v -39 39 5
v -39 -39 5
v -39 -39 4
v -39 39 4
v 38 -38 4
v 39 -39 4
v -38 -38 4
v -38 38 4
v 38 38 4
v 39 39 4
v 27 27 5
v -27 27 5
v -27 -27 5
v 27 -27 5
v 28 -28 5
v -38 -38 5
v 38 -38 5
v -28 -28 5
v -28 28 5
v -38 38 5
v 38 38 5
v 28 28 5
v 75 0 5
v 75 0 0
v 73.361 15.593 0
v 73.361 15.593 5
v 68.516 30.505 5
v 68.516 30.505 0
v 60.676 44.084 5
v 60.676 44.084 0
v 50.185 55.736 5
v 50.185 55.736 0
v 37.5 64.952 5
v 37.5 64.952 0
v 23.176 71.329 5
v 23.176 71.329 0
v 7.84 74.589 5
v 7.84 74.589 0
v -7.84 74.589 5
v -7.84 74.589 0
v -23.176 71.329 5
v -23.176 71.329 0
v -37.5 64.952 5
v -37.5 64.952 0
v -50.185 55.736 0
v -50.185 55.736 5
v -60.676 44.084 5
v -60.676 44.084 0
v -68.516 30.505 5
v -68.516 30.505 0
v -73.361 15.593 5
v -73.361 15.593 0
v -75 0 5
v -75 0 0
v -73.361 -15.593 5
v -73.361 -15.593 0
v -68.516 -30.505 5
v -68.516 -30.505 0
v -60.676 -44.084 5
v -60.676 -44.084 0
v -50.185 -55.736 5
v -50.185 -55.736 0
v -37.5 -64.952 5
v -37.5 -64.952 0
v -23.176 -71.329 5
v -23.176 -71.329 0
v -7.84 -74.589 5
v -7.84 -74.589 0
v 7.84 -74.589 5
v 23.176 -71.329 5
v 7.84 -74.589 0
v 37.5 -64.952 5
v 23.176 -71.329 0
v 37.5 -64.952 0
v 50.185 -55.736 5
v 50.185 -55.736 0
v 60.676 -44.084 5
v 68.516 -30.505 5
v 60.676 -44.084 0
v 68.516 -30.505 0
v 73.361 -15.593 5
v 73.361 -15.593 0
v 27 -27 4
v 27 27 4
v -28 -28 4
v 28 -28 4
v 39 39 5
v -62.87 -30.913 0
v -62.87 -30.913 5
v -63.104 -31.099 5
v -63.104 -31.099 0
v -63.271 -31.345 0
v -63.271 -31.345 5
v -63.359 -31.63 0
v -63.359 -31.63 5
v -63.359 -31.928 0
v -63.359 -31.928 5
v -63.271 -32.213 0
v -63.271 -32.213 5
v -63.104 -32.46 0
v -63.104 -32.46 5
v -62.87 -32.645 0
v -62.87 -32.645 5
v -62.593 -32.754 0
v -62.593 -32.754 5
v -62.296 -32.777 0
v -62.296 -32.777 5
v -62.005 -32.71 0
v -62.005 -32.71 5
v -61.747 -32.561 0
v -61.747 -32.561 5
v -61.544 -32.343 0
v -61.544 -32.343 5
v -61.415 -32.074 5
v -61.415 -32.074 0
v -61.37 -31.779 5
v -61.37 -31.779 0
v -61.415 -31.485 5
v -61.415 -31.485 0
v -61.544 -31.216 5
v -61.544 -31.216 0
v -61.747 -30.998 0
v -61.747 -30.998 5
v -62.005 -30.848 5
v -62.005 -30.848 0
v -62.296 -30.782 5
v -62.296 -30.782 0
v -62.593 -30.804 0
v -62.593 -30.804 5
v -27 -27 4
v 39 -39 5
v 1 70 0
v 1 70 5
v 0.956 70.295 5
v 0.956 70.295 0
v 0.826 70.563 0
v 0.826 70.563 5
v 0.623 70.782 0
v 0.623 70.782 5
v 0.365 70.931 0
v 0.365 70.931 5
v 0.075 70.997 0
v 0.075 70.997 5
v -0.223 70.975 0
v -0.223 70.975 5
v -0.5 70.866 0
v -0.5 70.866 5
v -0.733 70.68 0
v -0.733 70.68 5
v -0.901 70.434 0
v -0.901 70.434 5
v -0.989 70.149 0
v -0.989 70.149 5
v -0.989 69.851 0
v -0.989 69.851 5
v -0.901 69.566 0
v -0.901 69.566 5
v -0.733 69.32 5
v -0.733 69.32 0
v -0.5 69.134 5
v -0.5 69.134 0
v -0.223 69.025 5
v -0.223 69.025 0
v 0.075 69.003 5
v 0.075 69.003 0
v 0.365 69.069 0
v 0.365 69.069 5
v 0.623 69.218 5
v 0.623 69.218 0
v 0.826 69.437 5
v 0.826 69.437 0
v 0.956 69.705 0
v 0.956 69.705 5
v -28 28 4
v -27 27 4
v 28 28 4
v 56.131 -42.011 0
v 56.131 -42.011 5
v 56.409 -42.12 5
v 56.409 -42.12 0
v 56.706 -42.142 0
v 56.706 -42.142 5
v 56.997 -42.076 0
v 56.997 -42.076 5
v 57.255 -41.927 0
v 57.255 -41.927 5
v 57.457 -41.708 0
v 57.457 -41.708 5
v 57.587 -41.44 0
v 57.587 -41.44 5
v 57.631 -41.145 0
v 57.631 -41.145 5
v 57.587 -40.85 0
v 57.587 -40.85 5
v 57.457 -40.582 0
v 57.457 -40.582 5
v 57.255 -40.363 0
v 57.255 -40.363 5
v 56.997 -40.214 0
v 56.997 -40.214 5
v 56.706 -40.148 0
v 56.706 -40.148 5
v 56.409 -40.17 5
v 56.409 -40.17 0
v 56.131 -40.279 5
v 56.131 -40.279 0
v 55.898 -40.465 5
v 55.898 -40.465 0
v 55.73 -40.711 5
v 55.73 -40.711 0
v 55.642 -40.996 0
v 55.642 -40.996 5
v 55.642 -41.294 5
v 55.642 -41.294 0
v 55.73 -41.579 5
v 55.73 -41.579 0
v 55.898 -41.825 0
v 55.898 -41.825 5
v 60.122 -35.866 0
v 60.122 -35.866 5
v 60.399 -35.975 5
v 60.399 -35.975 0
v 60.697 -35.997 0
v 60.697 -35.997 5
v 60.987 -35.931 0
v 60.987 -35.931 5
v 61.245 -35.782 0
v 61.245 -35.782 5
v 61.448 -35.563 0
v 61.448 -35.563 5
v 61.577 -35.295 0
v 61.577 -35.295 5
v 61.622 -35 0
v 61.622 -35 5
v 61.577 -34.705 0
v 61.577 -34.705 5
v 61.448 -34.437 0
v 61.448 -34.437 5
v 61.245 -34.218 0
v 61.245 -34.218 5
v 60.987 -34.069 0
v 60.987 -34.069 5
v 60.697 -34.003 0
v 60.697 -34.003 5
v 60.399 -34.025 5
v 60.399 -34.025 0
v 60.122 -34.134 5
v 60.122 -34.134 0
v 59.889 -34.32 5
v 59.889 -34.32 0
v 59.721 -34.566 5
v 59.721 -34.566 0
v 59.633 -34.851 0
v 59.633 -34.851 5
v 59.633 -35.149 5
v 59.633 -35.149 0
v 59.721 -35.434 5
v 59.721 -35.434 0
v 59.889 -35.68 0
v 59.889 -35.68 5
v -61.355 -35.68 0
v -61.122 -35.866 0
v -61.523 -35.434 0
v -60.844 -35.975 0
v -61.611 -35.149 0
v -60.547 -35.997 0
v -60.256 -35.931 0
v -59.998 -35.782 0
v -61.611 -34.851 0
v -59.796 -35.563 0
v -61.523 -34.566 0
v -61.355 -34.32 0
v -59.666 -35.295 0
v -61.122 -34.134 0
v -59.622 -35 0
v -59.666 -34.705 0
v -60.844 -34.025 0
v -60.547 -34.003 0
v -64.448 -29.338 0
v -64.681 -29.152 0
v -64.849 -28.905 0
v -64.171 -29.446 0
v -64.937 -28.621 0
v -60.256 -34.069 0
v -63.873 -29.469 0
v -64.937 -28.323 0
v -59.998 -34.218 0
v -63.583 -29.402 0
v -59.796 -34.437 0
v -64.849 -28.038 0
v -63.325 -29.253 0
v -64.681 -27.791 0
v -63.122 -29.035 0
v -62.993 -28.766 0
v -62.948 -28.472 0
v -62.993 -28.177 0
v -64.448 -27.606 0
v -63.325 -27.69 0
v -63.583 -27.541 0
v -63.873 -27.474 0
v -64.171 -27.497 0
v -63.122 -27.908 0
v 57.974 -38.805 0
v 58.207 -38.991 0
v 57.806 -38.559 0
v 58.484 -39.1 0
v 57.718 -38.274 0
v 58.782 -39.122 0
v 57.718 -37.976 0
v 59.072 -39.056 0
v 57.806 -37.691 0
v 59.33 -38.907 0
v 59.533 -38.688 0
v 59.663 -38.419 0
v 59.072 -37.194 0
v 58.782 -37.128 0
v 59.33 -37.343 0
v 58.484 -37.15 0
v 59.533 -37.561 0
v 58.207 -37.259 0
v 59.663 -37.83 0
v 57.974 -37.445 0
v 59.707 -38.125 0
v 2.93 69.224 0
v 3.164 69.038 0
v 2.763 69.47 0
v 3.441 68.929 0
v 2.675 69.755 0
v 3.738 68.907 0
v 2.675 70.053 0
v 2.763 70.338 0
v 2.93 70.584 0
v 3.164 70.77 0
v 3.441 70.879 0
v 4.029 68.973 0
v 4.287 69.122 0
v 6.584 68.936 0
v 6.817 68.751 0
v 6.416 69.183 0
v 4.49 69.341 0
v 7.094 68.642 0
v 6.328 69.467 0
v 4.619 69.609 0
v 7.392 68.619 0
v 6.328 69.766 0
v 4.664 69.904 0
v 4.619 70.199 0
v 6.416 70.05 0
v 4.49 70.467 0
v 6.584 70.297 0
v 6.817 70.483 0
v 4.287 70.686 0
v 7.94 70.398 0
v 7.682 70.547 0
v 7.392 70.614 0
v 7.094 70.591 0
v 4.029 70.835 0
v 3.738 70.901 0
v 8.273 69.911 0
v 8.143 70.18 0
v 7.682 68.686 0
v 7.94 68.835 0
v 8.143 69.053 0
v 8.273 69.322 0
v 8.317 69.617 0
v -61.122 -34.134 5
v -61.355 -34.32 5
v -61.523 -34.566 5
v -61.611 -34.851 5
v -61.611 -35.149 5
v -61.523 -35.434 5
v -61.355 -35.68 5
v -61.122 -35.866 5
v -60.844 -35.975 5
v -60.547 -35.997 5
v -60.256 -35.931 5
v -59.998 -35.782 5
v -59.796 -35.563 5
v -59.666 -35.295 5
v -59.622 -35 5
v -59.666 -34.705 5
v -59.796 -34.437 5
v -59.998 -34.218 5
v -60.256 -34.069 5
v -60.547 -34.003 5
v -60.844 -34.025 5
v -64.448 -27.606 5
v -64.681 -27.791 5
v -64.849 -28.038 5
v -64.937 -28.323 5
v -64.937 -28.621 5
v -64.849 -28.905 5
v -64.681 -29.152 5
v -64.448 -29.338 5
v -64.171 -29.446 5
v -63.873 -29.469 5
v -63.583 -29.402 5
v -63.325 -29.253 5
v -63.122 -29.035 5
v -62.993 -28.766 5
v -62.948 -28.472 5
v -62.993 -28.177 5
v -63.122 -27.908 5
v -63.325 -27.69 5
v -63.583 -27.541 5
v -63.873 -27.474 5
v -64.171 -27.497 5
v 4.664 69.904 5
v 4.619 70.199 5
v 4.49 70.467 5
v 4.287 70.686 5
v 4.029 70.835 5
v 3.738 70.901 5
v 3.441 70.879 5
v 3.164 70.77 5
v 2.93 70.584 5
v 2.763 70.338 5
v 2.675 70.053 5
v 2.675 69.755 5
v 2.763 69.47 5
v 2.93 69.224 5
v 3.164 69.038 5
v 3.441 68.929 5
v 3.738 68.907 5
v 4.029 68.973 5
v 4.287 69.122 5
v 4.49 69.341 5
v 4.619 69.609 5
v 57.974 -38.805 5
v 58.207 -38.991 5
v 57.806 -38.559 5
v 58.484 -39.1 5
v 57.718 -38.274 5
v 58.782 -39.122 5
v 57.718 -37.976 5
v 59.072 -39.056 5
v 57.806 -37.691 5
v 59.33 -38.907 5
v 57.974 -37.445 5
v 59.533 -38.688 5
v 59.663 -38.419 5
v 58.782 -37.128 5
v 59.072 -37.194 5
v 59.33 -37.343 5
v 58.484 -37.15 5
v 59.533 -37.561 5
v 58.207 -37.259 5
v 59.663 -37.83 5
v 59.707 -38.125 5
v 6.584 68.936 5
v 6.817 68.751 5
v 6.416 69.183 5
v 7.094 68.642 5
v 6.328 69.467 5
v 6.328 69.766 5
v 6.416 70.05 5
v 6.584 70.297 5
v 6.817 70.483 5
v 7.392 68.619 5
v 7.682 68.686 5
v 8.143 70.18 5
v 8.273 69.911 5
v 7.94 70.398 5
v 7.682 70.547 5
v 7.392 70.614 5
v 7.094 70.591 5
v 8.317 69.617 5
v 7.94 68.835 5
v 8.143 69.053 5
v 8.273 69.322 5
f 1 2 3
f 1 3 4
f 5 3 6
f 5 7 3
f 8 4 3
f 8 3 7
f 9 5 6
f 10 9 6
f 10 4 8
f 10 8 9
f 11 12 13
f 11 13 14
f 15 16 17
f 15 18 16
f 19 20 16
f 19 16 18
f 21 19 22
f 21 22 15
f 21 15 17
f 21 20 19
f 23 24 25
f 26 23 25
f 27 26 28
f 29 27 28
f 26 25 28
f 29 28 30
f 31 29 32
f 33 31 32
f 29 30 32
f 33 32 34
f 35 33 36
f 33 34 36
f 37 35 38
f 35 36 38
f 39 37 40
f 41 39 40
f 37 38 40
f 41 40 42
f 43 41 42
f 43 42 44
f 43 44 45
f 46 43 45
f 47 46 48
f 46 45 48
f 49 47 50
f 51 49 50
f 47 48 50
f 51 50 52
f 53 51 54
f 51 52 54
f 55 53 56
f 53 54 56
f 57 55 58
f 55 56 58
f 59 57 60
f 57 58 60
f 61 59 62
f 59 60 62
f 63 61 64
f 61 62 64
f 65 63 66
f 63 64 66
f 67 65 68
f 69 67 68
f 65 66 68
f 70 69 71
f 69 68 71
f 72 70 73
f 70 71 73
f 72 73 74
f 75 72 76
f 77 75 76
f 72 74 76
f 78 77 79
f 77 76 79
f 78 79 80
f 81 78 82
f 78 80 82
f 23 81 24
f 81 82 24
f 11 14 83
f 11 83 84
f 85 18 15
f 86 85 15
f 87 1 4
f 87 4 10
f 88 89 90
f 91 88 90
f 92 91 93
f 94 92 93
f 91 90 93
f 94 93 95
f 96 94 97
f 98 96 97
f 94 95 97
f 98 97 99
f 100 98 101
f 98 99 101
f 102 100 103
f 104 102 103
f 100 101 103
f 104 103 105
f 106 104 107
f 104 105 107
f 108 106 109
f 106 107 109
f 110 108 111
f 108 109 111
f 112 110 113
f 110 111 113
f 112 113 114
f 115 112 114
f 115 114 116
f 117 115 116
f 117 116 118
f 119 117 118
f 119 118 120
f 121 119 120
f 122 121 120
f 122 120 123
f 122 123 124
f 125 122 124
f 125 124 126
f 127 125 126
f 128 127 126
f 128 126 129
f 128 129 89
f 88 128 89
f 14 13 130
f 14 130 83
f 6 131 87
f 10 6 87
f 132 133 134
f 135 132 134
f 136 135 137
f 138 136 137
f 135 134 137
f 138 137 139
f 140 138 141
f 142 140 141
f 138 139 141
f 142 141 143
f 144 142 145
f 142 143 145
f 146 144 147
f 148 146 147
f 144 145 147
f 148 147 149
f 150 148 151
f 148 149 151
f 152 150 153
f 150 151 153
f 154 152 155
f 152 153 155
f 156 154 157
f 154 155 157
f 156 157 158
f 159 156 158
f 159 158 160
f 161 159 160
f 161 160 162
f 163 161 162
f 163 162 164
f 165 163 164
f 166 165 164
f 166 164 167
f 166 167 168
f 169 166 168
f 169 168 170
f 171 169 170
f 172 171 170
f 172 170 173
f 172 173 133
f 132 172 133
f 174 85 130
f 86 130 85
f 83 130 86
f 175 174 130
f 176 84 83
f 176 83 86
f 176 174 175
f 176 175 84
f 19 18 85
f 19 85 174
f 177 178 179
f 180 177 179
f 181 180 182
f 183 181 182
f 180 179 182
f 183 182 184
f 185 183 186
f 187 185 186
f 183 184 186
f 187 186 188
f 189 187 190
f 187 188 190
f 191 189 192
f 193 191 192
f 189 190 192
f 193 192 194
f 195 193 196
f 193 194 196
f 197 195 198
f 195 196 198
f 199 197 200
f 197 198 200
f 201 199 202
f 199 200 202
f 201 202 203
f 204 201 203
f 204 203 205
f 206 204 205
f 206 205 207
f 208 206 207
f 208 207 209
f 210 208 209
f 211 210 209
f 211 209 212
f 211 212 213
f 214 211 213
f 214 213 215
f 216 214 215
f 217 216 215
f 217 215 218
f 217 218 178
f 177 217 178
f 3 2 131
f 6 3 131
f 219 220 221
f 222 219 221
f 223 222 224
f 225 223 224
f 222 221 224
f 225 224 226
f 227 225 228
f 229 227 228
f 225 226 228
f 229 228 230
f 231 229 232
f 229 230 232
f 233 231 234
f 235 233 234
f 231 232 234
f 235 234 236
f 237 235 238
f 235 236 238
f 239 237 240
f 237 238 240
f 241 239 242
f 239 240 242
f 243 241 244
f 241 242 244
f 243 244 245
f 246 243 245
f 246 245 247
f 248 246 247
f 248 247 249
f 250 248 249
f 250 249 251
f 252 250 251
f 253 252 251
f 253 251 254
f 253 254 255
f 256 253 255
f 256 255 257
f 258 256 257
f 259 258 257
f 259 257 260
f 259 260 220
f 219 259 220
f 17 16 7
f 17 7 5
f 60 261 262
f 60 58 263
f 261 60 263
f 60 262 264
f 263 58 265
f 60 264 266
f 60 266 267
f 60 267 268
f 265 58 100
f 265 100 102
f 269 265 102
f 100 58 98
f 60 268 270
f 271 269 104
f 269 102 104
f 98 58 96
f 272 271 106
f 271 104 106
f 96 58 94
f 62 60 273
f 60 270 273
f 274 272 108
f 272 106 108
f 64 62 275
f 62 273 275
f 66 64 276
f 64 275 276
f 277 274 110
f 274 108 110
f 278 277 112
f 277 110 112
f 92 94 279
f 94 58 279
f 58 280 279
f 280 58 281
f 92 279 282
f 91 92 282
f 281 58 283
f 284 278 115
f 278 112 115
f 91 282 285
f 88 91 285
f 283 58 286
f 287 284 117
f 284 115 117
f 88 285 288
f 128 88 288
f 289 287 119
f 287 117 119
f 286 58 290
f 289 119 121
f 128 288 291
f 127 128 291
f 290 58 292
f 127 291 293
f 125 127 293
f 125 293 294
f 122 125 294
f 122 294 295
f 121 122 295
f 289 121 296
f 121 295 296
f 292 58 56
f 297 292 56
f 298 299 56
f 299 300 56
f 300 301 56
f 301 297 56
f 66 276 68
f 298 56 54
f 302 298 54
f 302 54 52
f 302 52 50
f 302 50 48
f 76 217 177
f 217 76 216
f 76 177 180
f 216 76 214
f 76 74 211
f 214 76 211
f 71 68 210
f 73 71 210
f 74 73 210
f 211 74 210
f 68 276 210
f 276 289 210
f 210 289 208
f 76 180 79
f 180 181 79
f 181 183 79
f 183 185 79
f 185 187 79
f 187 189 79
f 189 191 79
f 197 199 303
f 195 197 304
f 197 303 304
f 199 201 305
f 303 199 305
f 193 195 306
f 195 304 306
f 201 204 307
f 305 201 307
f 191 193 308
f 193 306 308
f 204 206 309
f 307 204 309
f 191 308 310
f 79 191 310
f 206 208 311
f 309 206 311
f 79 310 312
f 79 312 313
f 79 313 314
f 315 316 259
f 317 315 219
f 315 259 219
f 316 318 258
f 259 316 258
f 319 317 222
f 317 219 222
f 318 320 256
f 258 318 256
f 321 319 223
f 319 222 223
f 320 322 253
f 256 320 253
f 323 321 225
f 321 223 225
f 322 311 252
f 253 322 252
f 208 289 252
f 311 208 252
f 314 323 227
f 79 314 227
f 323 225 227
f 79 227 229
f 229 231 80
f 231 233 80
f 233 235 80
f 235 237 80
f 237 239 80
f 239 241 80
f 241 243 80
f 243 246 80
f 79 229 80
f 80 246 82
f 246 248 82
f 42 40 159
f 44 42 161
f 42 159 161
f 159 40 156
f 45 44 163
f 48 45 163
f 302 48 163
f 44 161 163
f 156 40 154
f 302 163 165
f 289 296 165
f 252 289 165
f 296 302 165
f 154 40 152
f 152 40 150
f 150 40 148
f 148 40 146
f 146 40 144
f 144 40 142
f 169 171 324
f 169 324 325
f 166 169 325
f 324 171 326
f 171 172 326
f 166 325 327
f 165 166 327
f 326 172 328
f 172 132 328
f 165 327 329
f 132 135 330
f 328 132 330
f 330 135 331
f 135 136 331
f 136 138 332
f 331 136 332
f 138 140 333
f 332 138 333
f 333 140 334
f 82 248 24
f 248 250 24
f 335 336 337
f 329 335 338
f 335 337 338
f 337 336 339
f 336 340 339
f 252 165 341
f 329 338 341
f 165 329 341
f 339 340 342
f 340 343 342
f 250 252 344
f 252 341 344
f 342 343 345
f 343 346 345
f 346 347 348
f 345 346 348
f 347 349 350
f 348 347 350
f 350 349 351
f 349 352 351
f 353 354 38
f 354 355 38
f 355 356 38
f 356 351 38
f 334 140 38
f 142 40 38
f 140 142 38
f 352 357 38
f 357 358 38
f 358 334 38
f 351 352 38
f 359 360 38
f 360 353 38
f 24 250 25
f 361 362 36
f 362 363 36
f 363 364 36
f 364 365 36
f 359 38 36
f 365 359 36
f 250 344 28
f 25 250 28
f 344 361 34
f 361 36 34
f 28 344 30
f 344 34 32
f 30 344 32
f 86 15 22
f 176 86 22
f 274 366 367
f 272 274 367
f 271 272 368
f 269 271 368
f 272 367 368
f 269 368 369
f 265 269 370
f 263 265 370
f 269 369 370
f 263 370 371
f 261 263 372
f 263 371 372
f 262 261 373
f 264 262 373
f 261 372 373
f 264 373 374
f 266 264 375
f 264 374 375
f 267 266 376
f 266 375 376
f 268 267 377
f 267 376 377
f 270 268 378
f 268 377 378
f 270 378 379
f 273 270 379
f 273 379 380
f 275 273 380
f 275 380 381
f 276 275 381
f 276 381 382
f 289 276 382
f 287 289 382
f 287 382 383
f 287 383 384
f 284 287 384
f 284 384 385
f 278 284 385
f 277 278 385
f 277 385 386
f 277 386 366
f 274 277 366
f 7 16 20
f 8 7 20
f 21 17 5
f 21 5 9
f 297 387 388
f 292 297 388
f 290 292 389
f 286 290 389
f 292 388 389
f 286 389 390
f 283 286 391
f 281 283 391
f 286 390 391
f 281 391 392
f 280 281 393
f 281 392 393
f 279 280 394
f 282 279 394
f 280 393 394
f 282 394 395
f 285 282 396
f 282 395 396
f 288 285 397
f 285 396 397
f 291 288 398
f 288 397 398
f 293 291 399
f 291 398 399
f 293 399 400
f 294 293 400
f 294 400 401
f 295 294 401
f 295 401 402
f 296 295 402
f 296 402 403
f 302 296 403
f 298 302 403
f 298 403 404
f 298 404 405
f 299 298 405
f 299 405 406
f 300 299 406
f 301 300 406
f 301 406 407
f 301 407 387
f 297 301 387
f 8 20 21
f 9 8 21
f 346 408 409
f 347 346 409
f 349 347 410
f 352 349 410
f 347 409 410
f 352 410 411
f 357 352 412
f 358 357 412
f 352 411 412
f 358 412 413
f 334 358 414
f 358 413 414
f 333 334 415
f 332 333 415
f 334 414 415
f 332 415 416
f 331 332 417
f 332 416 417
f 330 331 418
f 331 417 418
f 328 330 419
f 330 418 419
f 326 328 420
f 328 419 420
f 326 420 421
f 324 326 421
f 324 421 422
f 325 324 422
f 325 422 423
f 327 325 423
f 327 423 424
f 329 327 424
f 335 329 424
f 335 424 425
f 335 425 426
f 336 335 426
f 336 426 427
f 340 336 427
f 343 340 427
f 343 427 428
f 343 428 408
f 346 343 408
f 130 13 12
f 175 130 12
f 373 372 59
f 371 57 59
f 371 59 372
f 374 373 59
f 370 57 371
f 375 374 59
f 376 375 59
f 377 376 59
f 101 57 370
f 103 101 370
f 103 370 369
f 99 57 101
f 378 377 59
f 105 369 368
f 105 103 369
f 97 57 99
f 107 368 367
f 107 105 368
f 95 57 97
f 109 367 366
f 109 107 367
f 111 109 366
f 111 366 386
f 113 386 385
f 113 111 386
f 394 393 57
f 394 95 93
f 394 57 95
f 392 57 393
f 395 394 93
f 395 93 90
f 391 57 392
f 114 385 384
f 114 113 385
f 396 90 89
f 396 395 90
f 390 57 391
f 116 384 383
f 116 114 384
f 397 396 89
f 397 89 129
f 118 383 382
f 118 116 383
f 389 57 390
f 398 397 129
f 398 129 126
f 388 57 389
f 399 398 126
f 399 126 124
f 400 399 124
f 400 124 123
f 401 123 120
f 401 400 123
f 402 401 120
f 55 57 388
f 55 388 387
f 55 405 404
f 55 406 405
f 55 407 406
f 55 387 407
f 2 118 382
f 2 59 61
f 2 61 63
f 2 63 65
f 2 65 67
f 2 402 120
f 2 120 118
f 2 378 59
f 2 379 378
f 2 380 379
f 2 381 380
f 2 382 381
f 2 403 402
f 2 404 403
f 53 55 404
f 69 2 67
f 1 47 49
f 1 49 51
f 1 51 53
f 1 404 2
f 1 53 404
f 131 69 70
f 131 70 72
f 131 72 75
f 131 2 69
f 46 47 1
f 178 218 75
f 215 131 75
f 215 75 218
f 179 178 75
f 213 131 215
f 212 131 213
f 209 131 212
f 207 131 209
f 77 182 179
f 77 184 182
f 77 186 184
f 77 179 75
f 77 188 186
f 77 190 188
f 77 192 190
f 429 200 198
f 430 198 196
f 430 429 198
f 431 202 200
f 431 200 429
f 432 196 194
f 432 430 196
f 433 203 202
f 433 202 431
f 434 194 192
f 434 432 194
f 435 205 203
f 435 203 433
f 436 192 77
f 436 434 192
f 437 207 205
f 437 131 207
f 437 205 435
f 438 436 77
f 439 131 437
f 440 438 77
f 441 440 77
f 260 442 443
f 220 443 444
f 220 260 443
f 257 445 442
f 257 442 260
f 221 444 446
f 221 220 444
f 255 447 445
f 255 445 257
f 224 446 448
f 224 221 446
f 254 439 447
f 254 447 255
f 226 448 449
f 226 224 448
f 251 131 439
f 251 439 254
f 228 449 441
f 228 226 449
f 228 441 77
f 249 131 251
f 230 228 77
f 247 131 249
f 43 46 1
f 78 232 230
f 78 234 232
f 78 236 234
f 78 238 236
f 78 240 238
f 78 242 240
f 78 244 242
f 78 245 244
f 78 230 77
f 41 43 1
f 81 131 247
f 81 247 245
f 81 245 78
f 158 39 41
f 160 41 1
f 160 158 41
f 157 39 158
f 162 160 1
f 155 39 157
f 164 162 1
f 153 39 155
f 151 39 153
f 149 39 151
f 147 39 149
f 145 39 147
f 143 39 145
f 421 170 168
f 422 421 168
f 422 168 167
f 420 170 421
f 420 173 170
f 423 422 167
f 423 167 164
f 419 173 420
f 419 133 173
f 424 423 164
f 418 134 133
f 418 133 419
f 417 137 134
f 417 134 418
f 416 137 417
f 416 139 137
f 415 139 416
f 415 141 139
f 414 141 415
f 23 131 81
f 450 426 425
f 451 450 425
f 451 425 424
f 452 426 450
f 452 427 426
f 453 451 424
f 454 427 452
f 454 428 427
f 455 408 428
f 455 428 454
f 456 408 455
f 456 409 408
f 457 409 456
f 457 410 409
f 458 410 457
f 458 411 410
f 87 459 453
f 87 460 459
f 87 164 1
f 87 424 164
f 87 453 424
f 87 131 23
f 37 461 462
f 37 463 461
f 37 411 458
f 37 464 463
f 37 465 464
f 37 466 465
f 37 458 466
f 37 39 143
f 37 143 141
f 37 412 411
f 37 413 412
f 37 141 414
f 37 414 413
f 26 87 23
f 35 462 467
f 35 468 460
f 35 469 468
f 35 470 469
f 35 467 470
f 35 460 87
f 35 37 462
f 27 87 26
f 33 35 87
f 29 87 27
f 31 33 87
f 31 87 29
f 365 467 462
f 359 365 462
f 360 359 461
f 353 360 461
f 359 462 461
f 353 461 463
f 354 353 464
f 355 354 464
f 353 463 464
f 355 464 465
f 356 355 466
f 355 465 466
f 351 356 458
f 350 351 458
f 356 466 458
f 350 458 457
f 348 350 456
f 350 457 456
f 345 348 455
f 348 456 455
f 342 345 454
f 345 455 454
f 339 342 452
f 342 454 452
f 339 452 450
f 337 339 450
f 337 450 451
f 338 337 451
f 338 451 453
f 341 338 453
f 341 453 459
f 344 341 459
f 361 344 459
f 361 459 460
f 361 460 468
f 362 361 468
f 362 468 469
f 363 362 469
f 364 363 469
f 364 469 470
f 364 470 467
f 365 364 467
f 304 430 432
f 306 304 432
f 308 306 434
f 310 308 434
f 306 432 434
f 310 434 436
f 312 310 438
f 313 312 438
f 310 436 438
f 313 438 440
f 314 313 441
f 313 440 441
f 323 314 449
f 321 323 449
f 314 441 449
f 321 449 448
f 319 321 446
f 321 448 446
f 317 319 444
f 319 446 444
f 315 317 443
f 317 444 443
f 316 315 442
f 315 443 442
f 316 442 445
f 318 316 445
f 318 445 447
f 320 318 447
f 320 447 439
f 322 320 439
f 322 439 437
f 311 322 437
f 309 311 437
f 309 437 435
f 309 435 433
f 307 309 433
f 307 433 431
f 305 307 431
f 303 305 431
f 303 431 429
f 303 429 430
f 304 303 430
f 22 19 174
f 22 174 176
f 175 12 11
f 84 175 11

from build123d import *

# Parameters (mm, degrees)
F0_R            = 75
F1_DEPTH        = 5
F2_W            = 78
F2_H            = 78
F2_W_2          = 76
F2_H_2          = 76
F2_W_3          = 56
F2_H_3          = 56
F2_W_4          = 54
F2_H_4          = 54
F3_DEPTH        = 1
F4_R            = 1
F5_DEPTH        = 5.001
F5_COPIES_COUNT = 3


# Not quite as in the source:
# - a pattern or mirror of a feature is missing from the dataset's text; its kind, count and spacing are read off the source's solid


with BuildPart() as f1:
    # F0 (on Top) → F1 (new body)
    with BuildSketch(Plane.XY):
        Circle(F0_R)
    extrude(amount=F1_DEPTH)

    # F2 (on face) → F3 (cut)
    with BuildSketch(Plane.XY.offset(5)):
        Rectangle(F2_W, F2_H)
        Rectangle(F2_W_2, F2_H_2, mode=Mode.SUBTRACT)
        Rectangle(F2_W_3, F2_H_3)
        Rectangle(F2_W_4, F2_H_4, mode=Mode.SUBTRACT)
    extrude(amount=-F3_DEPTH, mode=Mode.SUBTRACT)

    # F4 (on face) → F5 (cut, through all)
    with BuildSketch(Plane.XY.offset(5)):
        with Locations((0, 70)):
            Circle(F4_R)
        with Locations((3.663516937, 69.9040674328)):
            Circle(F4_R)
        with Locations((7.3169924287, 69.6165326758)):
            Circle(F4_R)
    f5 = extrude(amount=-F5_DEPTH, mode=Mode.SUBTRACT)

    # F5_copies: F5 ×3 about axis
    f5_copies_axis = Axis((0, 0, 0), (0, 0, 1))
    for i in range(1, F5_COPIES_COUNT):
        add(f5.rotate(f5_copies_axis, i * 360 / F5_COPIES_COUNT), mode=Mode.SUBTRACT)


solid = f1.part
